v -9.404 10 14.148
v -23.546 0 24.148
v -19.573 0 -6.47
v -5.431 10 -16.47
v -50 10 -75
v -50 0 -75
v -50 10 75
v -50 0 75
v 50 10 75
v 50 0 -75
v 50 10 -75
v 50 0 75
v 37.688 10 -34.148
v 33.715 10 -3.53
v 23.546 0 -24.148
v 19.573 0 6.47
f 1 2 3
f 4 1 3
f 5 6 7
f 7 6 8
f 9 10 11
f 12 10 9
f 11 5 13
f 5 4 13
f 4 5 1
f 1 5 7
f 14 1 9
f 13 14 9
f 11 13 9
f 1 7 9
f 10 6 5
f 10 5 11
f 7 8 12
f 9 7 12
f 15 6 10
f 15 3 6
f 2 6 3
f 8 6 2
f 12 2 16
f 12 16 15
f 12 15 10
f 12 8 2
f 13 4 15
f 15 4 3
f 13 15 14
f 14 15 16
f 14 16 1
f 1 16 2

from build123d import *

# Parameters (mm, degrees)
F0_W     = 100
F0_H     = 150
F1_DEPTH = 10
F7_DEPTH = 177.856339


with BuildPart() as f1:
    # F0 (on Front) → F1 (new body)
    with BuildSketch(Plane.XZ):
        Rectangle(F0_W, F0_H)
    extrude(amount=-F1_DEPTH)

    # F6 (on face) → F7 (cut, through all)
    with BuildSketch(Plane(origin=(-70.710678, -50, 50), x_dir=(0.408248, -0.866025, -0.288675), z_dir=(-0.707107, -0.5, 0.5))):
        Polygon((-16.583499, 6.122708), (-6.122708, -16.583499), (16.583499, -6.122708), (6.122708, 16.583499), align=None)
    extrude(amount=-F7_DEPTH, mode=Mode.SUBTRACT)


solid = f1.part
